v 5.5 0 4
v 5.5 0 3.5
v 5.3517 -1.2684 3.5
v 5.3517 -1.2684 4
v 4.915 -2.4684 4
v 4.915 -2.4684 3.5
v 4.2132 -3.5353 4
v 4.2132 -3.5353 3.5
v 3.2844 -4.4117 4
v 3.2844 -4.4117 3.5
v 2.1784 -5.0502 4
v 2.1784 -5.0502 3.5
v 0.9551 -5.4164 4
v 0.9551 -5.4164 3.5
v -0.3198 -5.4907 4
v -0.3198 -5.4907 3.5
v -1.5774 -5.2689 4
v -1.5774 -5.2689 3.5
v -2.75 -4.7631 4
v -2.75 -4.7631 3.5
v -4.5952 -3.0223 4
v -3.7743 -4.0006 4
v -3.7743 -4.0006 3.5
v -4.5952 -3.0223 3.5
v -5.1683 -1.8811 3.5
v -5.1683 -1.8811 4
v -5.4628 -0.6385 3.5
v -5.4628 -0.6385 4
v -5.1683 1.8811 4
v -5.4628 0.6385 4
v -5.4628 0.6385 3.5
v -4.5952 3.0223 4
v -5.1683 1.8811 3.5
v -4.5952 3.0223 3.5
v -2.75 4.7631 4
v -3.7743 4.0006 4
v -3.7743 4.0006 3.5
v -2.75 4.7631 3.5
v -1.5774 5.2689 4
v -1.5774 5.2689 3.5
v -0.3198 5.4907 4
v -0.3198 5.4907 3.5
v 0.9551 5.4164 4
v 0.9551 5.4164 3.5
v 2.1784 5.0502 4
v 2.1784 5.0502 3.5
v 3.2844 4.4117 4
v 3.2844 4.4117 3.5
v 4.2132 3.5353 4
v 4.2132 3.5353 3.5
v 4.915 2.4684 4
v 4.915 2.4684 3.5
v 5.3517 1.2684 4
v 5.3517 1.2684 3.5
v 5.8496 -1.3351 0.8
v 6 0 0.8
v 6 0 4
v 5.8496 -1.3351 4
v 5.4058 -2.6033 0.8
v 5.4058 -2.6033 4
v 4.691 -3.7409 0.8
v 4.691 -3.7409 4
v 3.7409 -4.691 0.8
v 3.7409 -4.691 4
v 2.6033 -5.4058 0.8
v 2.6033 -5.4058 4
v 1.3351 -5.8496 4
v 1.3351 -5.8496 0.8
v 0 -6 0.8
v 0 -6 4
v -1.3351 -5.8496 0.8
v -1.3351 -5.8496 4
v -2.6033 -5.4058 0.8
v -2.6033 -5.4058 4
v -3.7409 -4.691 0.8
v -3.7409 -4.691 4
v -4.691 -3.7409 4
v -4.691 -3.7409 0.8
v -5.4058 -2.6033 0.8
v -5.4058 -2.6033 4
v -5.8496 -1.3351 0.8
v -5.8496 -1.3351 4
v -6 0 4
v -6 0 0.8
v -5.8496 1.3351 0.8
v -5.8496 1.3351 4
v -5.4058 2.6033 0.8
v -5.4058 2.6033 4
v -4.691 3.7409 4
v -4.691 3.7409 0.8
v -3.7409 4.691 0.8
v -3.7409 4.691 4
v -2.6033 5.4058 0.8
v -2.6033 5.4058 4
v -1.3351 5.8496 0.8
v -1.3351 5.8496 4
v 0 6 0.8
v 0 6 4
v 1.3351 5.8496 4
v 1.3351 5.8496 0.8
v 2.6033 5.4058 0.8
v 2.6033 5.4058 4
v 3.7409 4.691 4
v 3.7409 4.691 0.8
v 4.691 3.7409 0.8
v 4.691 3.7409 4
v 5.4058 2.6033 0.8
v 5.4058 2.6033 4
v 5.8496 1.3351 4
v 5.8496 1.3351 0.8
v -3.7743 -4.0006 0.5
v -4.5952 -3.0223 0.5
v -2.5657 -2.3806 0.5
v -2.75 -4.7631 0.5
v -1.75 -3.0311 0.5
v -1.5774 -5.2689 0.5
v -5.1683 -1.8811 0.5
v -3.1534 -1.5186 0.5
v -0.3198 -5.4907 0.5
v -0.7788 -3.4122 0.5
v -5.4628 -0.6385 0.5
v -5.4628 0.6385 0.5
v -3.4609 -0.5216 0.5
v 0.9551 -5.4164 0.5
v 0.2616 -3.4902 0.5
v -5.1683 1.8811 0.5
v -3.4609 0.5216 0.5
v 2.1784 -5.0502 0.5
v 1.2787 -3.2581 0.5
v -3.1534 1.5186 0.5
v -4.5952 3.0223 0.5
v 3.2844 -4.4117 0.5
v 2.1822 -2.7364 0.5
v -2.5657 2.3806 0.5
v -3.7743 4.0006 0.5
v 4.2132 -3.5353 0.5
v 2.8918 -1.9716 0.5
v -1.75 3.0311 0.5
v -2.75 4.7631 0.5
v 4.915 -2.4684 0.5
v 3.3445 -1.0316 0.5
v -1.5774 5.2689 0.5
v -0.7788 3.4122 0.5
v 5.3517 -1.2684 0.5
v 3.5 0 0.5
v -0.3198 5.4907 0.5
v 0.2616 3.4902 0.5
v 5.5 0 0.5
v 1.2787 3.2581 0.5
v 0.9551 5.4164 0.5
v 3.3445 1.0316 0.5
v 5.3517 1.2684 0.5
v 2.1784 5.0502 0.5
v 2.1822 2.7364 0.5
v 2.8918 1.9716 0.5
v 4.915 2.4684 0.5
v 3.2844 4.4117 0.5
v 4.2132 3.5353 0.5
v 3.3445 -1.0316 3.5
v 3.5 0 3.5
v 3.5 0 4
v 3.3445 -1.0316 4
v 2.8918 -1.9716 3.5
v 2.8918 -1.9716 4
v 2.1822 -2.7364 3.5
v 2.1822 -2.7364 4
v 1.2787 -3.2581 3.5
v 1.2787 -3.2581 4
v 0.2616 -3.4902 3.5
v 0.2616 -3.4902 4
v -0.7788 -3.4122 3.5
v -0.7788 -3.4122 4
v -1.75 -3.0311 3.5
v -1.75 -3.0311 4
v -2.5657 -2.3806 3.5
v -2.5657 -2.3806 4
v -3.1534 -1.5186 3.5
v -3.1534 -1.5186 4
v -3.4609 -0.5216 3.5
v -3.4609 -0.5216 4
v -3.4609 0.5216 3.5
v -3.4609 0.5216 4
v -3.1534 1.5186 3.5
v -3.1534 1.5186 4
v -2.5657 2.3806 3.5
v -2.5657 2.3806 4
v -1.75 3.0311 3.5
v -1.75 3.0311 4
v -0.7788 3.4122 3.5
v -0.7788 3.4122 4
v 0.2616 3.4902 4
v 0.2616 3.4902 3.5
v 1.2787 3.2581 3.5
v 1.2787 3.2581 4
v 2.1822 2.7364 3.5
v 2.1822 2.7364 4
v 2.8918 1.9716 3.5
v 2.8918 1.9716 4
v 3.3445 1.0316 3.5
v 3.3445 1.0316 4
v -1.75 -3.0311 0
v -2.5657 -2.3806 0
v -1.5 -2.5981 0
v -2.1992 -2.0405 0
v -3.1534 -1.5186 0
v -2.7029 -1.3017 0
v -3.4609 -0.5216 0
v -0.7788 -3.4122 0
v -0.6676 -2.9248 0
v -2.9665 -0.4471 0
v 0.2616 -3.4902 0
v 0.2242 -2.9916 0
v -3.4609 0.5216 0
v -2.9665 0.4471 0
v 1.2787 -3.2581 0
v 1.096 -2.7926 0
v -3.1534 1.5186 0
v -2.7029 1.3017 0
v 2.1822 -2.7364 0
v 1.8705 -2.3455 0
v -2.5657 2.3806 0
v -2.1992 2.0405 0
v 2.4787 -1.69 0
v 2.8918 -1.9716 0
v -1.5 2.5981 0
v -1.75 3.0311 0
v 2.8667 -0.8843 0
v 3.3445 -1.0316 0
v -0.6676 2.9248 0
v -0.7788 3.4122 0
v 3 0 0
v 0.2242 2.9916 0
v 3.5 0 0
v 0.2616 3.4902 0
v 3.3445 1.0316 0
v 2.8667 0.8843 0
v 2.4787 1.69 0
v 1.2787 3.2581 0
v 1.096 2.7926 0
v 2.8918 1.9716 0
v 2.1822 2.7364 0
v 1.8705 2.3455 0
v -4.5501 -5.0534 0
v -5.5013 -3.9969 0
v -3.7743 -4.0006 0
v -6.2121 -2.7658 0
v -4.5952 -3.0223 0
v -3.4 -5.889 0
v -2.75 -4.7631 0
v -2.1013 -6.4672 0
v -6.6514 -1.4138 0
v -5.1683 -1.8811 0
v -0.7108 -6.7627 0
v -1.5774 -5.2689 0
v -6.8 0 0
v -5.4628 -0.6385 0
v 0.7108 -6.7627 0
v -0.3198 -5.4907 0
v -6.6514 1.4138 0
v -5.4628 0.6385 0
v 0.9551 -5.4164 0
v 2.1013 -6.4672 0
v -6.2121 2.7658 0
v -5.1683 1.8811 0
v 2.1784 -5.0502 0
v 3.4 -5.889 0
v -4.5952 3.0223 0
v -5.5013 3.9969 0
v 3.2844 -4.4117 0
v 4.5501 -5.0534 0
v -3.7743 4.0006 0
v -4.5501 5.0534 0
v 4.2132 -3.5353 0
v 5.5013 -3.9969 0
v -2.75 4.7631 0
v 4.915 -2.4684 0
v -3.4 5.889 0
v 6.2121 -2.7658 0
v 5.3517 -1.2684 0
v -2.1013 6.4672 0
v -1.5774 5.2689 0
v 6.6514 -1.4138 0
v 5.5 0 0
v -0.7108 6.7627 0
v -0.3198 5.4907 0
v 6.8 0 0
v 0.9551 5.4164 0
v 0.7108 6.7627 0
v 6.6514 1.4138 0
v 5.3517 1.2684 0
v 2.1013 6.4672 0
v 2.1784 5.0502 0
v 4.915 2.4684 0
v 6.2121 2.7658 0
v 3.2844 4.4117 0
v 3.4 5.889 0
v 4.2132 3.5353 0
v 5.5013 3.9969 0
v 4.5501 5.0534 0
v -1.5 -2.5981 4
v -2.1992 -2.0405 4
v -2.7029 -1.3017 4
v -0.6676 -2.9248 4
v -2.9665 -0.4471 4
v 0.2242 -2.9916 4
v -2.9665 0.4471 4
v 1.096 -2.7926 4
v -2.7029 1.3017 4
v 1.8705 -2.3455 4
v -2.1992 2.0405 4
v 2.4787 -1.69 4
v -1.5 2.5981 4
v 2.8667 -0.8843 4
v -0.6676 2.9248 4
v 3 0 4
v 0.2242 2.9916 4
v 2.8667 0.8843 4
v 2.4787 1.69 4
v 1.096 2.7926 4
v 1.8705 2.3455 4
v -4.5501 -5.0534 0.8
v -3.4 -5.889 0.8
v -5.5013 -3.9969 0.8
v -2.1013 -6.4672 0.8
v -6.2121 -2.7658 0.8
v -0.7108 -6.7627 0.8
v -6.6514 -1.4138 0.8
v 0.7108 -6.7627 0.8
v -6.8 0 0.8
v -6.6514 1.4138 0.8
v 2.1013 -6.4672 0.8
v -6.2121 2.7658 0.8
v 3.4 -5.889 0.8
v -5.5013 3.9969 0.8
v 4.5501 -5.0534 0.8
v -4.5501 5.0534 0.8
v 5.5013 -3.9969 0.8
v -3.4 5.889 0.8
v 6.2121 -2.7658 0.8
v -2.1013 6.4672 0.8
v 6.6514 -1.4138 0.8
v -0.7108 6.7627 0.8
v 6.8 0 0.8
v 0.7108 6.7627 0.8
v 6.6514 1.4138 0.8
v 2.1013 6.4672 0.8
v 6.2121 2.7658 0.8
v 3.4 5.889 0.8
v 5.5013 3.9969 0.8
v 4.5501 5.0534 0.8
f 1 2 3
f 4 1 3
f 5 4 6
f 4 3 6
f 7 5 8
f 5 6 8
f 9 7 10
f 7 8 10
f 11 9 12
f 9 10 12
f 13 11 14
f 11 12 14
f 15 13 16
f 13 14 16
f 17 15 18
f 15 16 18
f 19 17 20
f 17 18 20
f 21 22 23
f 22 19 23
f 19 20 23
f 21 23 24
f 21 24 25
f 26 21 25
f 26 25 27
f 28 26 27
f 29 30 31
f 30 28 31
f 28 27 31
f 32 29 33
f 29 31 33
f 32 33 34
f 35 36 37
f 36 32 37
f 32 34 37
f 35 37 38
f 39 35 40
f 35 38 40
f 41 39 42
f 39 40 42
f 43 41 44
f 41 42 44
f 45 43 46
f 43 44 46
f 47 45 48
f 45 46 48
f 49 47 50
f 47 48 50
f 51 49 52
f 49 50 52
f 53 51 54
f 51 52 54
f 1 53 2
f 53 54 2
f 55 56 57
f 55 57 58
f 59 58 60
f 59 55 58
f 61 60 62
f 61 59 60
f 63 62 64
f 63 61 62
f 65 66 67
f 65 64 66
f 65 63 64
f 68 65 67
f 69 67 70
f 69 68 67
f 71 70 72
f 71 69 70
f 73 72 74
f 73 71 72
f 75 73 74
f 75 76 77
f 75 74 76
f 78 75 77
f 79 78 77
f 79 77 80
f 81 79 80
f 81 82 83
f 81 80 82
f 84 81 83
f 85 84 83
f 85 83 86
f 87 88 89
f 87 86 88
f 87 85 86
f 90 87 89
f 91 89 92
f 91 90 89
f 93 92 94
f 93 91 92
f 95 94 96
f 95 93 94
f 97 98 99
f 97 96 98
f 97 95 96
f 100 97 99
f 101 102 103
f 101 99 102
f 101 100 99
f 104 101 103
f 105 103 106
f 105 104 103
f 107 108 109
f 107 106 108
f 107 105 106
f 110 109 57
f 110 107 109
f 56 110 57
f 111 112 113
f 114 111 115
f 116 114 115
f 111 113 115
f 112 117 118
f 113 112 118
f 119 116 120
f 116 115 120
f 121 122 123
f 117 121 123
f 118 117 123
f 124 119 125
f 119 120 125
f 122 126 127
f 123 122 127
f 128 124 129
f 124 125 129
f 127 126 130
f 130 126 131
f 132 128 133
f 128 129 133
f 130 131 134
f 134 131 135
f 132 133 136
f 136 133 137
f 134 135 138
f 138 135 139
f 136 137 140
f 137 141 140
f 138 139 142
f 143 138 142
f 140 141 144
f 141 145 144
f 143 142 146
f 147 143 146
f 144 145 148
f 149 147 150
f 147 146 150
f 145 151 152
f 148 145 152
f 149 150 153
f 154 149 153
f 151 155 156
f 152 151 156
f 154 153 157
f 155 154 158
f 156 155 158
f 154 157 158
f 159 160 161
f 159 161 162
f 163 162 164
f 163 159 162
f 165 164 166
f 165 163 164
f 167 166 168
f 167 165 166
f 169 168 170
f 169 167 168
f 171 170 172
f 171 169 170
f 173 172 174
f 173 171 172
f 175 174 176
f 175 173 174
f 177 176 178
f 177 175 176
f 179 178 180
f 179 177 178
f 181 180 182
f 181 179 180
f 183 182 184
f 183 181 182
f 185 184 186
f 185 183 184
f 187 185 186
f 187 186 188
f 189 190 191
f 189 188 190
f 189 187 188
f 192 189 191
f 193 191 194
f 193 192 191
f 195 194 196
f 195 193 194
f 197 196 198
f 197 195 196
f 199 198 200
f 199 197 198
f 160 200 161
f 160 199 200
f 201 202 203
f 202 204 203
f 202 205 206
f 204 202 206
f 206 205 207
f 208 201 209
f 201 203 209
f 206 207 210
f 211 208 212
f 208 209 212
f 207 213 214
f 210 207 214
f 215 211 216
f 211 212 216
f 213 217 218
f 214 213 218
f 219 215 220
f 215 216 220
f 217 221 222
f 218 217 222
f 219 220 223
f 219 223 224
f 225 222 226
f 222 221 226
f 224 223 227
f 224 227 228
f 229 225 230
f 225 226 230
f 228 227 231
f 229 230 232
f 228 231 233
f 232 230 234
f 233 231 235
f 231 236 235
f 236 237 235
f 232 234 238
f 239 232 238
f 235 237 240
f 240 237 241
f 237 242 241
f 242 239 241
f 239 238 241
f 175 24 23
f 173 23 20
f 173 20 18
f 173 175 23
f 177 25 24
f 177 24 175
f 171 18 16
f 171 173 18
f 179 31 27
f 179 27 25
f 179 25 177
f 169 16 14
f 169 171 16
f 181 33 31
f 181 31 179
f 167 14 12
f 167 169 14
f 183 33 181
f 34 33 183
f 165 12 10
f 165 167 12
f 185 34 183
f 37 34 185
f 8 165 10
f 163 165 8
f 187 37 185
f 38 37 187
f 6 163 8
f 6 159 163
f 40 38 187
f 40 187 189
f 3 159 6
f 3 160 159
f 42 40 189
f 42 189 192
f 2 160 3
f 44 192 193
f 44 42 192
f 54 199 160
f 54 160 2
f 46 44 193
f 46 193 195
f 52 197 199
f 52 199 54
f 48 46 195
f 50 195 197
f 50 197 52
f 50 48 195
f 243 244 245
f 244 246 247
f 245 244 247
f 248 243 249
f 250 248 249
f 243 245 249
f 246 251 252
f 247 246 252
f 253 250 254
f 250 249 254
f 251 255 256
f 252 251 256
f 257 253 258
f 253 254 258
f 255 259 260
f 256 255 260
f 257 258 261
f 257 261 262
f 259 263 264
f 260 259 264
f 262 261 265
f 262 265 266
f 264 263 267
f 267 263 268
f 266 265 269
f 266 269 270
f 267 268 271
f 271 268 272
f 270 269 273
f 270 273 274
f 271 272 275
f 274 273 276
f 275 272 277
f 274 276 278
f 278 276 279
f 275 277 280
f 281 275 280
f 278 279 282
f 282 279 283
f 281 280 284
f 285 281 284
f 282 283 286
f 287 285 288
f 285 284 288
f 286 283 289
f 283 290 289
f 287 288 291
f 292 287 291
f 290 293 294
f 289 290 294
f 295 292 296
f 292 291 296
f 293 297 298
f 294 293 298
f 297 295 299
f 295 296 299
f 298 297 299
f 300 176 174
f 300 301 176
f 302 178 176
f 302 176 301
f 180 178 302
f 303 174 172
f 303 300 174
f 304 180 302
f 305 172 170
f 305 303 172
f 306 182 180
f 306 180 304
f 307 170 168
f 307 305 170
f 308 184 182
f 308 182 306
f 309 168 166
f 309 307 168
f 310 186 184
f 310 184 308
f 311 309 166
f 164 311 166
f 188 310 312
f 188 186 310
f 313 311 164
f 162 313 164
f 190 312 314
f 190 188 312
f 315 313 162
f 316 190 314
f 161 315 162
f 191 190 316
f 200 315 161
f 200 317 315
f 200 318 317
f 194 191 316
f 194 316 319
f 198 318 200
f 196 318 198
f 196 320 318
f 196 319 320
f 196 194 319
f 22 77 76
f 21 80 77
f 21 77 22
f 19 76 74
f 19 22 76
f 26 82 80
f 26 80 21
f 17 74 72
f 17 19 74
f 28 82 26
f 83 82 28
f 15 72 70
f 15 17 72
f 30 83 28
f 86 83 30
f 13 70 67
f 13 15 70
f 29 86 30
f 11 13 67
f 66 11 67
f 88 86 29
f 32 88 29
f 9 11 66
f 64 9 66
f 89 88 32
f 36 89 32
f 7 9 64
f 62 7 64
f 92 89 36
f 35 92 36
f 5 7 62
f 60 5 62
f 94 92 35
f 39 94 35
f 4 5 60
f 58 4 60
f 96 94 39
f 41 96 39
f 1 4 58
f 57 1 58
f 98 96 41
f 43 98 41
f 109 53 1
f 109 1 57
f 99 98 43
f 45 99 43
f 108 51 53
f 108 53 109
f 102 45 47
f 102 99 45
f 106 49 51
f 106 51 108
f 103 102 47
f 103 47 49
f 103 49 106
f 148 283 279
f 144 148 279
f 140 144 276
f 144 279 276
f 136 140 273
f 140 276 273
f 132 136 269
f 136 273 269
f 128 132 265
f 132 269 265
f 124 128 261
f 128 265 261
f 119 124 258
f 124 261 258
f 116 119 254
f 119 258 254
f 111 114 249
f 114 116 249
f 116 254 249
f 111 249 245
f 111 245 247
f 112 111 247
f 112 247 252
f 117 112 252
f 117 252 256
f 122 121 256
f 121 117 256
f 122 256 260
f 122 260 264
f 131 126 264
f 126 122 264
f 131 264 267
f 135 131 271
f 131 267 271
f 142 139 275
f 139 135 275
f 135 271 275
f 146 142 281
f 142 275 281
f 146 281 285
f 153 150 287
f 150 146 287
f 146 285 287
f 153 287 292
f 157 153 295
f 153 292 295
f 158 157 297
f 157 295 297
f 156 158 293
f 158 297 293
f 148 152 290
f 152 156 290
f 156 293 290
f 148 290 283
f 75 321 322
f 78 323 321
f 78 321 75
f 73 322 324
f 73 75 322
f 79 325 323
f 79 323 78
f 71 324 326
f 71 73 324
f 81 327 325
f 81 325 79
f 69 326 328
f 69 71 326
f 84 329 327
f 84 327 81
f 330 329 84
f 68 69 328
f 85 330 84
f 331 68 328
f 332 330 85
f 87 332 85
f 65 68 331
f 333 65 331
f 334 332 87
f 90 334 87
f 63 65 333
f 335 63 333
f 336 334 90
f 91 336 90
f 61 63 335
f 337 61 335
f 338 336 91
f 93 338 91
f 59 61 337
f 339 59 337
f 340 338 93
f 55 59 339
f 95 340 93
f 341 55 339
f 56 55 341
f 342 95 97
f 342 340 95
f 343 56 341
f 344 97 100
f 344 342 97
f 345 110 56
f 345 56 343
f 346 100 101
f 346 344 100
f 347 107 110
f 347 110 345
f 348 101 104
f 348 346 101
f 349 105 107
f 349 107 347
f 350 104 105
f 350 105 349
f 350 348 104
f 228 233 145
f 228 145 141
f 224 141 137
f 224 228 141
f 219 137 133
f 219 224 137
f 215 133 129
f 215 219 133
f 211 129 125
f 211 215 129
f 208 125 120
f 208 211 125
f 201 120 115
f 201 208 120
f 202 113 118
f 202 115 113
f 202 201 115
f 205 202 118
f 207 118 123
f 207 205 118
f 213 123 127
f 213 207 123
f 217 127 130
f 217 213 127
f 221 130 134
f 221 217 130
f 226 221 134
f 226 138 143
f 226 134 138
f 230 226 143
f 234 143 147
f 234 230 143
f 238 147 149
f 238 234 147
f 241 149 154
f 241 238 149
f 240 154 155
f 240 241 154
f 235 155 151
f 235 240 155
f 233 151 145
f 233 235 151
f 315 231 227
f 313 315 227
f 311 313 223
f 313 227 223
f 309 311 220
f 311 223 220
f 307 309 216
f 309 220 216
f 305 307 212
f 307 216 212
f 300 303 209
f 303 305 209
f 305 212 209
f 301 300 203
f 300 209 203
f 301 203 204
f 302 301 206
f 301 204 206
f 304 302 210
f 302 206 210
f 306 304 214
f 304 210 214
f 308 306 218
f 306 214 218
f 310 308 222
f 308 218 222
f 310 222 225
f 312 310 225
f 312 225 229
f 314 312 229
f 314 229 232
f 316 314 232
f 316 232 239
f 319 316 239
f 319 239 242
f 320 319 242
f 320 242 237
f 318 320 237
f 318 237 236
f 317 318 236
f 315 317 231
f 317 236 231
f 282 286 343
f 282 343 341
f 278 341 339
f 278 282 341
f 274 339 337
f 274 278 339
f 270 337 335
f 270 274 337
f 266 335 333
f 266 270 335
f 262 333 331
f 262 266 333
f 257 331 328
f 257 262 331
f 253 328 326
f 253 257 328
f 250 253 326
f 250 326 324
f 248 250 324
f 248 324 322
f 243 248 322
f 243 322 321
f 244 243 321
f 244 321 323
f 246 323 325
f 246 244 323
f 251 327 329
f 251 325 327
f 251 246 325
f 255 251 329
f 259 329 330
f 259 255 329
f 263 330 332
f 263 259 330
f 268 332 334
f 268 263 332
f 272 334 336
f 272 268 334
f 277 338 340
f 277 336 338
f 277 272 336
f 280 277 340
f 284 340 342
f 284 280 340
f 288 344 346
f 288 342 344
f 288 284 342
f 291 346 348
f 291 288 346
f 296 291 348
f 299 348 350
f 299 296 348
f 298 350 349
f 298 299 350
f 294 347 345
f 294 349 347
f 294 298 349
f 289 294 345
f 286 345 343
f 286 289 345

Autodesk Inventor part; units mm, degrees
ref_plane "YZ Plane" through (0, 0, 0) normal (1, 0, 0) x (0, 1, 0)
ref_plane "XZ Plane" through (0, 0, 0) normal (0, 1, 0) x (-1, 0, 0)
ref_plane "XY Plane" through (0, 0, 0) normal (0, 0, 1) x (1, 0, 0)
sketch "スケッチ1" plane through (0, 0, 0) normal (0, 0, 1) x (1, 0, 0)
  circle A0 centre (0, 0) radius 6
  circle A1 centre (0, 0) radius 3
  circle A2 centre (0, 0) radius 6.8
  circle A3 centre (0, 0) radius 5.5
  circle A4 centre (0, 0) radius 3.5
  dimension "d0" = 12
  dimension "d1" = 6
  dimension "d4" = 0.8
  dimension "d6" = 0.5
  dimension "d7" = 0.5
extrude "押し出し1" add sketch "スケッチ1" along normal blind 0.8 contours A2
extrude "押し出し2" add sketch "スケッチ1" along normal blind 4 contours A0 | A4
extrude "押し出し3" add sketch "スケッチ1" along normal blind 3.5 contours A3
extrude "押し出し5" cut sketch "スケッチ1" along normal blind 0.5 contours A3
properties part number "ベアリングフランジ6-12"
